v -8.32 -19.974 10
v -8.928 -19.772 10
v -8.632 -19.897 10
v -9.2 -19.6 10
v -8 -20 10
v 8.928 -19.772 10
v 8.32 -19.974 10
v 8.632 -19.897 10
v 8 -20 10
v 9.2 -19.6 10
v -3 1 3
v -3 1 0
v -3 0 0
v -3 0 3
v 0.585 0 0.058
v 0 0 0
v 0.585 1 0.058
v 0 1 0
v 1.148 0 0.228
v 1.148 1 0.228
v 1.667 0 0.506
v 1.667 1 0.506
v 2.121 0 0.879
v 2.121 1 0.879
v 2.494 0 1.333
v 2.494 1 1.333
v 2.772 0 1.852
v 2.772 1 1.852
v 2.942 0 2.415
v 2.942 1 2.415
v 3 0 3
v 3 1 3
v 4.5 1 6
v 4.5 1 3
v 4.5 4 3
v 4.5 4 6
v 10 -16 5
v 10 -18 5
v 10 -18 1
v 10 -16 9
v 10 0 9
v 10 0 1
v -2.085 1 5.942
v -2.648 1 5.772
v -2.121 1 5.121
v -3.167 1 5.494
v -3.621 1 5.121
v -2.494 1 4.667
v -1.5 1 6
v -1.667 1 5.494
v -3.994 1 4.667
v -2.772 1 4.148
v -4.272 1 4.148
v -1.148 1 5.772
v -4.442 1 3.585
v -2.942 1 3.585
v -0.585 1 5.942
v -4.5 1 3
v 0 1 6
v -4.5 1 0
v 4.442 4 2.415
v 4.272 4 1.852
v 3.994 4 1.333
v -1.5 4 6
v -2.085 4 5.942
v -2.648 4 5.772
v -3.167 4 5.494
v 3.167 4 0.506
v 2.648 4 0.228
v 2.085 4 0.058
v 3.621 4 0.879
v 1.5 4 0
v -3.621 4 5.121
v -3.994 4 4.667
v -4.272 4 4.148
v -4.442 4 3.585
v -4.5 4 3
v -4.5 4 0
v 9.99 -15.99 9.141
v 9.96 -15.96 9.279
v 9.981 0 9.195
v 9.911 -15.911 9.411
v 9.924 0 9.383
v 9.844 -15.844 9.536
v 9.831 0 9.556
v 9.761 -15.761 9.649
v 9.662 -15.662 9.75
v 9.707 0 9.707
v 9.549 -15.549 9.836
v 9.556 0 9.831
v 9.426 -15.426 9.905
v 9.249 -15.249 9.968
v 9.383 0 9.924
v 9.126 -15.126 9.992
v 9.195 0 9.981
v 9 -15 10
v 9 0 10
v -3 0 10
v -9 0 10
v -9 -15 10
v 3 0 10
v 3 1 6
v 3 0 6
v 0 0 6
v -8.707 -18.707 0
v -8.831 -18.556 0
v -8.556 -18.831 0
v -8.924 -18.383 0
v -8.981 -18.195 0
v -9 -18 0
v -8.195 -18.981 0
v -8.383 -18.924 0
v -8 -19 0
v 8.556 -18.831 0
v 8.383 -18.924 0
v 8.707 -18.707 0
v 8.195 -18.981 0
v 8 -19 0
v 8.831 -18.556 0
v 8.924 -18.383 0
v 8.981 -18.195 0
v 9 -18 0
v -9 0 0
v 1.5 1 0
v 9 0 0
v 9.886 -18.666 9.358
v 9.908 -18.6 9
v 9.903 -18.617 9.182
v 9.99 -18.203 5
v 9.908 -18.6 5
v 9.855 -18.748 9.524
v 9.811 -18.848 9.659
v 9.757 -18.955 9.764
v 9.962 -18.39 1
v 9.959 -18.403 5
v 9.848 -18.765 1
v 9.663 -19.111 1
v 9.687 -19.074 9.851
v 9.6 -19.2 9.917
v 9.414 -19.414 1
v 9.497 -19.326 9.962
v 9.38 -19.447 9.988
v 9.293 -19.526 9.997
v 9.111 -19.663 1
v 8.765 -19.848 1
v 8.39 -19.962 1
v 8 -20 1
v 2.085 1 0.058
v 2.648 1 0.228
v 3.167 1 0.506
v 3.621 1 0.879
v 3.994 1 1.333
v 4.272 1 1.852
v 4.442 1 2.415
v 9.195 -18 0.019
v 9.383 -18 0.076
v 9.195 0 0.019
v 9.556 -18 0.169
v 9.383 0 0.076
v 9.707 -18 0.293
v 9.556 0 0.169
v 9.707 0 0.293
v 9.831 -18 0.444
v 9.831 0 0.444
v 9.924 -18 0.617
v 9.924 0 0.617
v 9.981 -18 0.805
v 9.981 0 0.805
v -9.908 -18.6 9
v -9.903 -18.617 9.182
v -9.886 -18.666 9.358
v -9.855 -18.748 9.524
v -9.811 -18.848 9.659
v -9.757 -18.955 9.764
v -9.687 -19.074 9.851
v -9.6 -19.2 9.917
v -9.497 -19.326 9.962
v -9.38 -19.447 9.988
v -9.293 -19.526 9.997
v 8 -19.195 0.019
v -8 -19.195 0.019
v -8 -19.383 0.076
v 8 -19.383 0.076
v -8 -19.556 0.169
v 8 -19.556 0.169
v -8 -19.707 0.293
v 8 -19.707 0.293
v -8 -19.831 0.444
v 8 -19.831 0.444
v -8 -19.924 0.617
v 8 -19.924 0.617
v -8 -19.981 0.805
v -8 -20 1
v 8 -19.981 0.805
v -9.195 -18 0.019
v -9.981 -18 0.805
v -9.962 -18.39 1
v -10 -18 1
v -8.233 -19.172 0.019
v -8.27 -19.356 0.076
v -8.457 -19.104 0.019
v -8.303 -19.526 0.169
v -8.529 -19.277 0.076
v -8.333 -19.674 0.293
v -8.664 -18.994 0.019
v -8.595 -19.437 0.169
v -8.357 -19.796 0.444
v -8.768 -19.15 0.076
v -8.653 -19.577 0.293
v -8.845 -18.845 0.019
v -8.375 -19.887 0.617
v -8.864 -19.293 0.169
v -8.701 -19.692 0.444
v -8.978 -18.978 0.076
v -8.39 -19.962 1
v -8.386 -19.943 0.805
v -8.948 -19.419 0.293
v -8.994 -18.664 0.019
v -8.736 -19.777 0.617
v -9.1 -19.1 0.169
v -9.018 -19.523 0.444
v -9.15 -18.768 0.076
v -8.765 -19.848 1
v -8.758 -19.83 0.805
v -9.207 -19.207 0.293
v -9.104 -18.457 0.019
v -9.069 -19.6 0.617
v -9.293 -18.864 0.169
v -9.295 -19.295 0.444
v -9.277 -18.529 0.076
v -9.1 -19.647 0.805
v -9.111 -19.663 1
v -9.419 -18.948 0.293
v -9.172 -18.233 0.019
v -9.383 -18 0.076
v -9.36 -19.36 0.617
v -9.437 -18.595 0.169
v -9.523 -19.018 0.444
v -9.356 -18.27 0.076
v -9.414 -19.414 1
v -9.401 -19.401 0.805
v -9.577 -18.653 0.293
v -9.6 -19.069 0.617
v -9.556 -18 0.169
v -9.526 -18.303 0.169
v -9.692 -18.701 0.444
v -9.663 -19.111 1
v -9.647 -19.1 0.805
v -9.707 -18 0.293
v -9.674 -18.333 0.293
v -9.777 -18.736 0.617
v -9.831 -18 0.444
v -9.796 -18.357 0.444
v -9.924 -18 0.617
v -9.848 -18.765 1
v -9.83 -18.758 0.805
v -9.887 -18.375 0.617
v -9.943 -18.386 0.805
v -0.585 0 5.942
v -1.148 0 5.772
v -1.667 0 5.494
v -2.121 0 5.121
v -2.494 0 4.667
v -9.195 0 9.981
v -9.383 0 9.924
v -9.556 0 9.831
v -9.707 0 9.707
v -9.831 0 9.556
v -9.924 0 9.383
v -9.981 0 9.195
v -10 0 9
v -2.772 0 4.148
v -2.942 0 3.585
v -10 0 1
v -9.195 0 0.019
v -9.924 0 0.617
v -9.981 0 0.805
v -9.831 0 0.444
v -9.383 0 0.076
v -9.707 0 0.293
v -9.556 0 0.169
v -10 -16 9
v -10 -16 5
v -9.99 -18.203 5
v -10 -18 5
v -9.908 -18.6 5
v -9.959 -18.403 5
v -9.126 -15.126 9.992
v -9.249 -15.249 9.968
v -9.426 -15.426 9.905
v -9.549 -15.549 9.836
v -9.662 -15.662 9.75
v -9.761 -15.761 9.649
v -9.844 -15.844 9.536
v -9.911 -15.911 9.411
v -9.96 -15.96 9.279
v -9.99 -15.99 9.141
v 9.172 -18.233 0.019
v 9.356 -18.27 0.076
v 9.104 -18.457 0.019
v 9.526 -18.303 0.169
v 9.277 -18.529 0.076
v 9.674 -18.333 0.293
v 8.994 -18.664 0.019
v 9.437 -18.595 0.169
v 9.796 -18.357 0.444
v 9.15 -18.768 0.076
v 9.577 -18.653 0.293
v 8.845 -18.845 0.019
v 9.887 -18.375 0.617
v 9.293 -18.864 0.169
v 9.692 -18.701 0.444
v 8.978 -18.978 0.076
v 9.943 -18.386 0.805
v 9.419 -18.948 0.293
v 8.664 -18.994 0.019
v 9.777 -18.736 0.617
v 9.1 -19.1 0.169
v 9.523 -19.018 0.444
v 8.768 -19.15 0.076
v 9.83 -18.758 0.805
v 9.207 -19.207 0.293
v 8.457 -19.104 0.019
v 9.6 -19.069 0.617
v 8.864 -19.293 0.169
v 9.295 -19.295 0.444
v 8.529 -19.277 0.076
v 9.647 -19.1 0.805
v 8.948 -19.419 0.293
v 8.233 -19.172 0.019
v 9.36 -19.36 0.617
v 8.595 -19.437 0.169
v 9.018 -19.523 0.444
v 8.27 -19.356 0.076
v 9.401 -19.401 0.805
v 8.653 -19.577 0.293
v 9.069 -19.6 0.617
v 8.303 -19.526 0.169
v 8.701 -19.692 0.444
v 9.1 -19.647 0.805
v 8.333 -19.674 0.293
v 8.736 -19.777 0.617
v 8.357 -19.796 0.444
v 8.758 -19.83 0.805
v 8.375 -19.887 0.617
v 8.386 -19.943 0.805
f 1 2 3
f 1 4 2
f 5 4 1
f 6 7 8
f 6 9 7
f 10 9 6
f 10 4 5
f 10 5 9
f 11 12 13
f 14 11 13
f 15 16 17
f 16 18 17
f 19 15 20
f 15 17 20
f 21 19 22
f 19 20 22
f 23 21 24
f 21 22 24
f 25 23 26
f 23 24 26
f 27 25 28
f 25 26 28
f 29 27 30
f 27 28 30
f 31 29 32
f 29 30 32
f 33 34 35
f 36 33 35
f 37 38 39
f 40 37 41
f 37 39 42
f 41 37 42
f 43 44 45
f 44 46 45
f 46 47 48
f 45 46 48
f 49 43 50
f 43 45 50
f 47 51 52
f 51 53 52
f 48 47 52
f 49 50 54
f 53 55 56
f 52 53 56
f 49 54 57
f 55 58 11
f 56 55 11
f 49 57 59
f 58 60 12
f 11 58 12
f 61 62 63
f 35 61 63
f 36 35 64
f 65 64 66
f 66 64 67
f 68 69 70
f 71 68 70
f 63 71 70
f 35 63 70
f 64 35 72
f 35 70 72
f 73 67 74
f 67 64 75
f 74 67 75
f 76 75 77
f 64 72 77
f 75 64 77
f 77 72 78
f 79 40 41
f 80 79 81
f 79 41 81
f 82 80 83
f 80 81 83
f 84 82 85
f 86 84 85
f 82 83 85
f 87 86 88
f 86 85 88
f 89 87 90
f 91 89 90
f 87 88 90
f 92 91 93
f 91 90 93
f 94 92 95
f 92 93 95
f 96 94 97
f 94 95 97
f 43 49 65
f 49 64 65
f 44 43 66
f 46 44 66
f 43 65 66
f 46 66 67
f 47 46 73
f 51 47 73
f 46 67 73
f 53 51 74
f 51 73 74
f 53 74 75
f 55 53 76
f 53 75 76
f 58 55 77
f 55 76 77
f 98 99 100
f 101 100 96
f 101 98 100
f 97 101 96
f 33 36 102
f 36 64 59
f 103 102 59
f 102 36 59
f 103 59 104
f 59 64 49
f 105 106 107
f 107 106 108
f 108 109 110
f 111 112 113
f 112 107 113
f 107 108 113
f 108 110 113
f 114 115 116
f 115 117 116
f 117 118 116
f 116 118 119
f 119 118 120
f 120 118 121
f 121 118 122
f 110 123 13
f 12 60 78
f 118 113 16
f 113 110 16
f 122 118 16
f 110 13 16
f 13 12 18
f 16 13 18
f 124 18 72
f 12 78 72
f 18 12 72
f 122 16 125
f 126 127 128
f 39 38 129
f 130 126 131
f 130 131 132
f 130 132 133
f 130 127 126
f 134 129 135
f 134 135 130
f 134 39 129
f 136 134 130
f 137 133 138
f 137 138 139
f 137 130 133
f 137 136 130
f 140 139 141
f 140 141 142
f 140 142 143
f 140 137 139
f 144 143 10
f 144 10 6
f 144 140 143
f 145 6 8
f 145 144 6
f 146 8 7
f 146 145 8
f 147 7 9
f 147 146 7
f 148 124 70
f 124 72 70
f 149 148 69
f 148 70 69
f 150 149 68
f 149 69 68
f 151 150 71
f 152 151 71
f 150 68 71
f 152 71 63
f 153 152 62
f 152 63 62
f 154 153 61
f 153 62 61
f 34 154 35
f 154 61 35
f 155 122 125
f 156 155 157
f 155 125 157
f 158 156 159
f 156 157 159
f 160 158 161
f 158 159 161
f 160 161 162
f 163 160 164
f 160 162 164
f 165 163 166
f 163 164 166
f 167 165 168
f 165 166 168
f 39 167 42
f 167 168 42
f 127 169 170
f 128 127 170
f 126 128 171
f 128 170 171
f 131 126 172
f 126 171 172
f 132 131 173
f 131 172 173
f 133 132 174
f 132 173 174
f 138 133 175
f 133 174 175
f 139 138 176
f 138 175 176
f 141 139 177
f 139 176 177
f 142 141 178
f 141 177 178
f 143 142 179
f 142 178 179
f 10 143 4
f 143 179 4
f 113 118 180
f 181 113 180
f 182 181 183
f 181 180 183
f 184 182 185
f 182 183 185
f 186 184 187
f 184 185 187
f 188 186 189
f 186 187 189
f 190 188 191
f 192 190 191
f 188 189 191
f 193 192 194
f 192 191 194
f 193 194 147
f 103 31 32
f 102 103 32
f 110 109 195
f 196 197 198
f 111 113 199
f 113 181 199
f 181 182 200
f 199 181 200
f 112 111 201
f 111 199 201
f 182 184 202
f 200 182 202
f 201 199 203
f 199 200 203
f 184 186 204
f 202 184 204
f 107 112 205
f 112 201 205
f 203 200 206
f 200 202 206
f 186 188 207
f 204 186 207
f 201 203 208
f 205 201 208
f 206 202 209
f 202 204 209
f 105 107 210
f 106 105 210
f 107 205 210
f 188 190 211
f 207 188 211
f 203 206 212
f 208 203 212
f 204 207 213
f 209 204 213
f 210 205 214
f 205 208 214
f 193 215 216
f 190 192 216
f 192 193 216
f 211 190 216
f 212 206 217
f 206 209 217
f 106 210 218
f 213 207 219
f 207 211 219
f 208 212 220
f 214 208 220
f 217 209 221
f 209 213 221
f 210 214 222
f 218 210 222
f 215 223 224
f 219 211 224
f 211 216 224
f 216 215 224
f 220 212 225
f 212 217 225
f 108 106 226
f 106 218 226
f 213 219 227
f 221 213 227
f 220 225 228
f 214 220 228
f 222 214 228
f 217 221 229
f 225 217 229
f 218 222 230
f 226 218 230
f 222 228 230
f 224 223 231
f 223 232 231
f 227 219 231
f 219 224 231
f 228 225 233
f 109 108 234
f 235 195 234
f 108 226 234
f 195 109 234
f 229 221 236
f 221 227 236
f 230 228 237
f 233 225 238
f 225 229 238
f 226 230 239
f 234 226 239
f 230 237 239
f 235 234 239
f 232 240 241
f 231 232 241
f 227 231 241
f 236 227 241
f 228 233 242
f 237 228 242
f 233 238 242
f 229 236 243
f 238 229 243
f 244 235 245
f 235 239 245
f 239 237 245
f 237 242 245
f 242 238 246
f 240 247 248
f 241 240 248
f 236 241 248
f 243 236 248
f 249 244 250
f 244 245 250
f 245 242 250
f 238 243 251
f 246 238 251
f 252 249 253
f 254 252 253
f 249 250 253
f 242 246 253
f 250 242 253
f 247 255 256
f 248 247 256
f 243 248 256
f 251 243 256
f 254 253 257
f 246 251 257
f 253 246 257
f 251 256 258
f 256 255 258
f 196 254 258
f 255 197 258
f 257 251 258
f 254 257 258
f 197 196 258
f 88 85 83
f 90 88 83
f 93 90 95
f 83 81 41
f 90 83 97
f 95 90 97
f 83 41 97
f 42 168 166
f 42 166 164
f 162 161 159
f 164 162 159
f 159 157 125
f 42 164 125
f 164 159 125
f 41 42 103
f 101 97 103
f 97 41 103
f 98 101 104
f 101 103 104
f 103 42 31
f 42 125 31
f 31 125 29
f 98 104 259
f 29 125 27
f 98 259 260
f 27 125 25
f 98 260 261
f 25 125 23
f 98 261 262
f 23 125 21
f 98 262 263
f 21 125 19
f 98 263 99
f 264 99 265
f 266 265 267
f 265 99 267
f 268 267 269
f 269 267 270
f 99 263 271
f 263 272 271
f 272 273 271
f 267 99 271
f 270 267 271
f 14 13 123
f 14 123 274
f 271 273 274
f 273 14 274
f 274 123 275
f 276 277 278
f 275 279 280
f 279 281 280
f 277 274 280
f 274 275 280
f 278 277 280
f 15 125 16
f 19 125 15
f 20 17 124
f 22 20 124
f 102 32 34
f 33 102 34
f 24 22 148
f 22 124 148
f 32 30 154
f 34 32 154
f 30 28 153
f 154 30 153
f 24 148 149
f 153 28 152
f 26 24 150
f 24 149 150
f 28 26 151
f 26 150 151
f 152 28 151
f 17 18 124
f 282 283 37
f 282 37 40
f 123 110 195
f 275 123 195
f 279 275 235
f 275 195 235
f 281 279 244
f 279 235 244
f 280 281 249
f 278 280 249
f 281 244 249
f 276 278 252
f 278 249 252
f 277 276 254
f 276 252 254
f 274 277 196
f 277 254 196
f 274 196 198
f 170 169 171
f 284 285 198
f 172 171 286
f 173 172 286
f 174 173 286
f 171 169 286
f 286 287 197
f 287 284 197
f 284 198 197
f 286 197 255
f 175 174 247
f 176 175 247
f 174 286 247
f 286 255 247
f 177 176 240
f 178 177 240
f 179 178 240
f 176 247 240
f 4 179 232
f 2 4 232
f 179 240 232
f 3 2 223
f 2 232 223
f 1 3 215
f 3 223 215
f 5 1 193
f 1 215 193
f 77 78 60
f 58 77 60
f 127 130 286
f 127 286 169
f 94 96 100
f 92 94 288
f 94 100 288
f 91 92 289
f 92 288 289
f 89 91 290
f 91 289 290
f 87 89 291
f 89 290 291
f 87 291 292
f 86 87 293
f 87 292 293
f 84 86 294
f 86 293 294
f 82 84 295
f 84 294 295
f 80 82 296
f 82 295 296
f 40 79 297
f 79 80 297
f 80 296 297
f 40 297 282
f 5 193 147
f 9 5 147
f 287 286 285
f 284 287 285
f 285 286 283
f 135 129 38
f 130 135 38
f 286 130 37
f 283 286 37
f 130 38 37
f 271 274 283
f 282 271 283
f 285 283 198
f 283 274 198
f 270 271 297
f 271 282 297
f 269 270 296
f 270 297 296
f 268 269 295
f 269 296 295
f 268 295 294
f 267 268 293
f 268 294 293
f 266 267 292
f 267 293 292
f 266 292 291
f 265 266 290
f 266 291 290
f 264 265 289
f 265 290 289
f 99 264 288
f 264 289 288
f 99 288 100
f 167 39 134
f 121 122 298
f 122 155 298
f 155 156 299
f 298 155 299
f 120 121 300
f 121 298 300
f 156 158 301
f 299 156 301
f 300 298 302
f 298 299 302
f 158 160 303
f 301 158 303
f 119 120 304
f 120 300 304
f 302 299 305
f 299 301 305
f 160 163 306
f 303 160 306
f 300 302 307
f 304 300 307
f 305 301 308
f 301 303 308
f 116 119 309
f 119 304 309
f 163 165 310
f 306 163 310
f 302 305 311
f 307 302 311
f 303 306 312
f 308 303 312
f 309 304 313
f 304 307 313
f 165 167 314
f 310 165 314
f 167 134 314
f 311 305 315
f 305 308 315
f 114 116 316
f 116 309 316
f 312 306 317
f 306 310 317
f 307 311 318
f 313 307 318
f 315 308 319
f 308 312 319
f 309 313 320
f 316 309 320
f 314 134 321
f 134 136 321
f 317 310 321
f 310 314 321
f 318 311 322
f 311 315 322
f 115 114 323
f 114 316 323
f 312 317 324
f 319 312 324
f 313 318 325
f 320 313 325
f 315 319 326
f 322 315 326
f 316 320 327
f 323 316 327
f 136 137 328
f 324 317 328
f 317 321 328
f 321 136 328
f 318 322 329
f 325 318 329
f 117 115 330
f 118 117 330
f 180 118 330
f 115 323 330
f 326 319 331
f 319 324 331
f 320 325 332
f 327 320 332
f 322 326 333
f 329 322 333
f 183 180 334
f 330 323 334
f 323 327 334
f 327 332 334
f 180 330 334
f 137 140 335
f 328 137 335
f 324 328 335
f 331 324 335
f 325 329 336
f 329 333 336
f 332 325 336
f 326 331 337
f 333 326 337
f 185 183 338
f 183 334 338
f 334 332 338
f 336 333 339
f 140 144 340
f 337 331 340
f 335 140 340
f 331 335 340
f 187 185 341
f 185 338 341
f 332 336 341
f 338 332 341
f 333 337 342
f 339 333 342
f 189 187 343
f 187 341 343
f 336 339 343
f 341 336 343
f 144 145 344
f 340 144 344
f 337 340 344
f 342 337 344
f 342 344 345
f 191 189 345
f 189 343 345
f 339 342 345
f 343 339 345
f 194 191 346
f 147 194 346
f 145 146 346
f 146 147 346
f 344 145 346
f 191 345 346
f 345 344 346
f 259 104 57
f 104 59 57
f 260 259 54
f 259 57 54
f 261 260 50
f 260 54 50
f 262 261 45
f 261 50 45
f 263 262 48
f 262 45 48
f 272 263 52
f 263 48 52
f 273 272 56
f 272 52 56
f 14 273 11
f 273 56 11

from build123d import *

# Parameters (mm, degrees)
F1_DEPTH    = 10
F2_W        = 4.5836600475
F2_H        = 4
F3_DEPTH    = 25
F4_W        = 2.6
F4_H        = 5
F5_DEPTH    = 25
F6_R        = 3
F7_R        = 3
F8_R        = 1
F9_T1_DEPTH = 15
F9_T4_ANGLE = 90
F9_T6_ANGLE = 90


# Not quite as in the source:
# - a fillet or chamfer that OpenCascade refuses, or shapes differently, is made with other operations: its cross-section is extruded or revolved along the edge and cut away or added


with BuildPart() as f1:
    # F0 (on Top) → F1 (new body)
    with BuildSketch(Plane.XY):
        Polygon((4.5, 4), (0, 4), (-4.5, 4), (-4.5, 1), (-3, 1), (-3, 0), (-4.5, 0), (-10, 0), (-10, -20), (0, -20), (10, -20), (10, 0), (4.5, 0), (3, 0), (3, 1), (4.5, 1), align=None)
    extrude(amount=F1_DEPTH)

    # F2 (on face) → F3 (cut)
    with BuildSketch(Plane(origin=(-10, 0, 0), x_dir=(0, -1, 0), z_dir=(-1, 0, 0))):
        with Locations((-2.2918300238, 8)):
            Rectangle(F2_W, F2_H)
    extrude(amount=-F3_DEPTH, mode=Mode.SUBTRACT)

    # F4 (on face) → F5 (cut)
    with BuildSketch(Plane.YZ.offset(10)):
        with Locations((-17.3, 7.5)):
            Rectangle(F4_W, F4_H)
    extrude(amount=-F5_DEPTH, mode=Mode.SUBTRACT)

    # F6
    f6_edges = [f1.edges().sort_by_distance(p)[0] for p in [
        (3, 0.5, 0),
        (-3, 0.5, 6),
    ]]
    fillet(f6_edges, radius=F6_R)

    # F7
    f7_edges = [f1.edges().sort_by_distance(p)[0] for p in [
        (4.5, 2.5, 0),
        (-4.5, 2.5, 6),
    ]]
    fillet(f7_edges, radius=F7_R)

    # F8
    f8_edges = [f1.edges().sort_by_distance(p)[0] for p in [
        (-10, -8, 10),
        (10, -8, 10),
        (-10, -10, 0),
        (0, -20, 0),
        (10, -10, 0),
        (0, -18.6, 10),
        (0, -16, 10),
    ]]
    fillet(f8_edges, radius=F8_R)

    # F9: fillet of radius 2 on 2 edges, made by hand

    # F9_s2 → F9_t1 (cut)
    with BuildSketch(Plane.XY):
        with BuildLine():
            ThreePointArc((10, -18), (9.4142135624, -19.4142135624), (8, -20))
            Line((8, -20), (10, -20))
            Line((10, -20), (10, -18))
        make_face()
        with BuildLine():
            ThreePointArc((-10, -18), (-9.4142135624, -19.4142135624), (-8, -20))
            Line((-8, -20), (-10, -20))
            Line((-10, -20), (-10, -18))
        make_face()
    extrude(amount=F9_T1_DEPTH, mode=Mode.SUBTRACT)

    # F9_s3 → F9_t4 (revolve, cut)
    with BuildSketch(Plane.YZ.offset(-8)):
        with BuildLine():
            ThreePointArc((-19, 0), (-19.7071067812, 0.2928932188), (-20, 1))
            Line((-20, 1), (-20, 0))
            Line((-20, 0), (-19, 0))
        make_face()
    revolve(axis=Axis((-8, -18, 0), (0, 0, -1)), revolution_arc=F9_T4_ANGLE, mode=Mode.SUBTRACT)

    # F9_s5 → F9_t6 (revolve, cut)
    with BuildSketch(Plane.XZ.offset(18)):
        with BuildLine():
            ThreePointArc((9, 0), (9.7071067812, 0.2928932188), (10, 1))
            Line((10, 1), (10, 0))
            Line((10, 0), (9, 0))
        make_face()
    revolve(axis=Axis((8, -18, 0), (0, 0, -1)), revolution_arc=F9_T6_ANGLE, mode=Mode.SUBTRACT)


solid = f1.part
